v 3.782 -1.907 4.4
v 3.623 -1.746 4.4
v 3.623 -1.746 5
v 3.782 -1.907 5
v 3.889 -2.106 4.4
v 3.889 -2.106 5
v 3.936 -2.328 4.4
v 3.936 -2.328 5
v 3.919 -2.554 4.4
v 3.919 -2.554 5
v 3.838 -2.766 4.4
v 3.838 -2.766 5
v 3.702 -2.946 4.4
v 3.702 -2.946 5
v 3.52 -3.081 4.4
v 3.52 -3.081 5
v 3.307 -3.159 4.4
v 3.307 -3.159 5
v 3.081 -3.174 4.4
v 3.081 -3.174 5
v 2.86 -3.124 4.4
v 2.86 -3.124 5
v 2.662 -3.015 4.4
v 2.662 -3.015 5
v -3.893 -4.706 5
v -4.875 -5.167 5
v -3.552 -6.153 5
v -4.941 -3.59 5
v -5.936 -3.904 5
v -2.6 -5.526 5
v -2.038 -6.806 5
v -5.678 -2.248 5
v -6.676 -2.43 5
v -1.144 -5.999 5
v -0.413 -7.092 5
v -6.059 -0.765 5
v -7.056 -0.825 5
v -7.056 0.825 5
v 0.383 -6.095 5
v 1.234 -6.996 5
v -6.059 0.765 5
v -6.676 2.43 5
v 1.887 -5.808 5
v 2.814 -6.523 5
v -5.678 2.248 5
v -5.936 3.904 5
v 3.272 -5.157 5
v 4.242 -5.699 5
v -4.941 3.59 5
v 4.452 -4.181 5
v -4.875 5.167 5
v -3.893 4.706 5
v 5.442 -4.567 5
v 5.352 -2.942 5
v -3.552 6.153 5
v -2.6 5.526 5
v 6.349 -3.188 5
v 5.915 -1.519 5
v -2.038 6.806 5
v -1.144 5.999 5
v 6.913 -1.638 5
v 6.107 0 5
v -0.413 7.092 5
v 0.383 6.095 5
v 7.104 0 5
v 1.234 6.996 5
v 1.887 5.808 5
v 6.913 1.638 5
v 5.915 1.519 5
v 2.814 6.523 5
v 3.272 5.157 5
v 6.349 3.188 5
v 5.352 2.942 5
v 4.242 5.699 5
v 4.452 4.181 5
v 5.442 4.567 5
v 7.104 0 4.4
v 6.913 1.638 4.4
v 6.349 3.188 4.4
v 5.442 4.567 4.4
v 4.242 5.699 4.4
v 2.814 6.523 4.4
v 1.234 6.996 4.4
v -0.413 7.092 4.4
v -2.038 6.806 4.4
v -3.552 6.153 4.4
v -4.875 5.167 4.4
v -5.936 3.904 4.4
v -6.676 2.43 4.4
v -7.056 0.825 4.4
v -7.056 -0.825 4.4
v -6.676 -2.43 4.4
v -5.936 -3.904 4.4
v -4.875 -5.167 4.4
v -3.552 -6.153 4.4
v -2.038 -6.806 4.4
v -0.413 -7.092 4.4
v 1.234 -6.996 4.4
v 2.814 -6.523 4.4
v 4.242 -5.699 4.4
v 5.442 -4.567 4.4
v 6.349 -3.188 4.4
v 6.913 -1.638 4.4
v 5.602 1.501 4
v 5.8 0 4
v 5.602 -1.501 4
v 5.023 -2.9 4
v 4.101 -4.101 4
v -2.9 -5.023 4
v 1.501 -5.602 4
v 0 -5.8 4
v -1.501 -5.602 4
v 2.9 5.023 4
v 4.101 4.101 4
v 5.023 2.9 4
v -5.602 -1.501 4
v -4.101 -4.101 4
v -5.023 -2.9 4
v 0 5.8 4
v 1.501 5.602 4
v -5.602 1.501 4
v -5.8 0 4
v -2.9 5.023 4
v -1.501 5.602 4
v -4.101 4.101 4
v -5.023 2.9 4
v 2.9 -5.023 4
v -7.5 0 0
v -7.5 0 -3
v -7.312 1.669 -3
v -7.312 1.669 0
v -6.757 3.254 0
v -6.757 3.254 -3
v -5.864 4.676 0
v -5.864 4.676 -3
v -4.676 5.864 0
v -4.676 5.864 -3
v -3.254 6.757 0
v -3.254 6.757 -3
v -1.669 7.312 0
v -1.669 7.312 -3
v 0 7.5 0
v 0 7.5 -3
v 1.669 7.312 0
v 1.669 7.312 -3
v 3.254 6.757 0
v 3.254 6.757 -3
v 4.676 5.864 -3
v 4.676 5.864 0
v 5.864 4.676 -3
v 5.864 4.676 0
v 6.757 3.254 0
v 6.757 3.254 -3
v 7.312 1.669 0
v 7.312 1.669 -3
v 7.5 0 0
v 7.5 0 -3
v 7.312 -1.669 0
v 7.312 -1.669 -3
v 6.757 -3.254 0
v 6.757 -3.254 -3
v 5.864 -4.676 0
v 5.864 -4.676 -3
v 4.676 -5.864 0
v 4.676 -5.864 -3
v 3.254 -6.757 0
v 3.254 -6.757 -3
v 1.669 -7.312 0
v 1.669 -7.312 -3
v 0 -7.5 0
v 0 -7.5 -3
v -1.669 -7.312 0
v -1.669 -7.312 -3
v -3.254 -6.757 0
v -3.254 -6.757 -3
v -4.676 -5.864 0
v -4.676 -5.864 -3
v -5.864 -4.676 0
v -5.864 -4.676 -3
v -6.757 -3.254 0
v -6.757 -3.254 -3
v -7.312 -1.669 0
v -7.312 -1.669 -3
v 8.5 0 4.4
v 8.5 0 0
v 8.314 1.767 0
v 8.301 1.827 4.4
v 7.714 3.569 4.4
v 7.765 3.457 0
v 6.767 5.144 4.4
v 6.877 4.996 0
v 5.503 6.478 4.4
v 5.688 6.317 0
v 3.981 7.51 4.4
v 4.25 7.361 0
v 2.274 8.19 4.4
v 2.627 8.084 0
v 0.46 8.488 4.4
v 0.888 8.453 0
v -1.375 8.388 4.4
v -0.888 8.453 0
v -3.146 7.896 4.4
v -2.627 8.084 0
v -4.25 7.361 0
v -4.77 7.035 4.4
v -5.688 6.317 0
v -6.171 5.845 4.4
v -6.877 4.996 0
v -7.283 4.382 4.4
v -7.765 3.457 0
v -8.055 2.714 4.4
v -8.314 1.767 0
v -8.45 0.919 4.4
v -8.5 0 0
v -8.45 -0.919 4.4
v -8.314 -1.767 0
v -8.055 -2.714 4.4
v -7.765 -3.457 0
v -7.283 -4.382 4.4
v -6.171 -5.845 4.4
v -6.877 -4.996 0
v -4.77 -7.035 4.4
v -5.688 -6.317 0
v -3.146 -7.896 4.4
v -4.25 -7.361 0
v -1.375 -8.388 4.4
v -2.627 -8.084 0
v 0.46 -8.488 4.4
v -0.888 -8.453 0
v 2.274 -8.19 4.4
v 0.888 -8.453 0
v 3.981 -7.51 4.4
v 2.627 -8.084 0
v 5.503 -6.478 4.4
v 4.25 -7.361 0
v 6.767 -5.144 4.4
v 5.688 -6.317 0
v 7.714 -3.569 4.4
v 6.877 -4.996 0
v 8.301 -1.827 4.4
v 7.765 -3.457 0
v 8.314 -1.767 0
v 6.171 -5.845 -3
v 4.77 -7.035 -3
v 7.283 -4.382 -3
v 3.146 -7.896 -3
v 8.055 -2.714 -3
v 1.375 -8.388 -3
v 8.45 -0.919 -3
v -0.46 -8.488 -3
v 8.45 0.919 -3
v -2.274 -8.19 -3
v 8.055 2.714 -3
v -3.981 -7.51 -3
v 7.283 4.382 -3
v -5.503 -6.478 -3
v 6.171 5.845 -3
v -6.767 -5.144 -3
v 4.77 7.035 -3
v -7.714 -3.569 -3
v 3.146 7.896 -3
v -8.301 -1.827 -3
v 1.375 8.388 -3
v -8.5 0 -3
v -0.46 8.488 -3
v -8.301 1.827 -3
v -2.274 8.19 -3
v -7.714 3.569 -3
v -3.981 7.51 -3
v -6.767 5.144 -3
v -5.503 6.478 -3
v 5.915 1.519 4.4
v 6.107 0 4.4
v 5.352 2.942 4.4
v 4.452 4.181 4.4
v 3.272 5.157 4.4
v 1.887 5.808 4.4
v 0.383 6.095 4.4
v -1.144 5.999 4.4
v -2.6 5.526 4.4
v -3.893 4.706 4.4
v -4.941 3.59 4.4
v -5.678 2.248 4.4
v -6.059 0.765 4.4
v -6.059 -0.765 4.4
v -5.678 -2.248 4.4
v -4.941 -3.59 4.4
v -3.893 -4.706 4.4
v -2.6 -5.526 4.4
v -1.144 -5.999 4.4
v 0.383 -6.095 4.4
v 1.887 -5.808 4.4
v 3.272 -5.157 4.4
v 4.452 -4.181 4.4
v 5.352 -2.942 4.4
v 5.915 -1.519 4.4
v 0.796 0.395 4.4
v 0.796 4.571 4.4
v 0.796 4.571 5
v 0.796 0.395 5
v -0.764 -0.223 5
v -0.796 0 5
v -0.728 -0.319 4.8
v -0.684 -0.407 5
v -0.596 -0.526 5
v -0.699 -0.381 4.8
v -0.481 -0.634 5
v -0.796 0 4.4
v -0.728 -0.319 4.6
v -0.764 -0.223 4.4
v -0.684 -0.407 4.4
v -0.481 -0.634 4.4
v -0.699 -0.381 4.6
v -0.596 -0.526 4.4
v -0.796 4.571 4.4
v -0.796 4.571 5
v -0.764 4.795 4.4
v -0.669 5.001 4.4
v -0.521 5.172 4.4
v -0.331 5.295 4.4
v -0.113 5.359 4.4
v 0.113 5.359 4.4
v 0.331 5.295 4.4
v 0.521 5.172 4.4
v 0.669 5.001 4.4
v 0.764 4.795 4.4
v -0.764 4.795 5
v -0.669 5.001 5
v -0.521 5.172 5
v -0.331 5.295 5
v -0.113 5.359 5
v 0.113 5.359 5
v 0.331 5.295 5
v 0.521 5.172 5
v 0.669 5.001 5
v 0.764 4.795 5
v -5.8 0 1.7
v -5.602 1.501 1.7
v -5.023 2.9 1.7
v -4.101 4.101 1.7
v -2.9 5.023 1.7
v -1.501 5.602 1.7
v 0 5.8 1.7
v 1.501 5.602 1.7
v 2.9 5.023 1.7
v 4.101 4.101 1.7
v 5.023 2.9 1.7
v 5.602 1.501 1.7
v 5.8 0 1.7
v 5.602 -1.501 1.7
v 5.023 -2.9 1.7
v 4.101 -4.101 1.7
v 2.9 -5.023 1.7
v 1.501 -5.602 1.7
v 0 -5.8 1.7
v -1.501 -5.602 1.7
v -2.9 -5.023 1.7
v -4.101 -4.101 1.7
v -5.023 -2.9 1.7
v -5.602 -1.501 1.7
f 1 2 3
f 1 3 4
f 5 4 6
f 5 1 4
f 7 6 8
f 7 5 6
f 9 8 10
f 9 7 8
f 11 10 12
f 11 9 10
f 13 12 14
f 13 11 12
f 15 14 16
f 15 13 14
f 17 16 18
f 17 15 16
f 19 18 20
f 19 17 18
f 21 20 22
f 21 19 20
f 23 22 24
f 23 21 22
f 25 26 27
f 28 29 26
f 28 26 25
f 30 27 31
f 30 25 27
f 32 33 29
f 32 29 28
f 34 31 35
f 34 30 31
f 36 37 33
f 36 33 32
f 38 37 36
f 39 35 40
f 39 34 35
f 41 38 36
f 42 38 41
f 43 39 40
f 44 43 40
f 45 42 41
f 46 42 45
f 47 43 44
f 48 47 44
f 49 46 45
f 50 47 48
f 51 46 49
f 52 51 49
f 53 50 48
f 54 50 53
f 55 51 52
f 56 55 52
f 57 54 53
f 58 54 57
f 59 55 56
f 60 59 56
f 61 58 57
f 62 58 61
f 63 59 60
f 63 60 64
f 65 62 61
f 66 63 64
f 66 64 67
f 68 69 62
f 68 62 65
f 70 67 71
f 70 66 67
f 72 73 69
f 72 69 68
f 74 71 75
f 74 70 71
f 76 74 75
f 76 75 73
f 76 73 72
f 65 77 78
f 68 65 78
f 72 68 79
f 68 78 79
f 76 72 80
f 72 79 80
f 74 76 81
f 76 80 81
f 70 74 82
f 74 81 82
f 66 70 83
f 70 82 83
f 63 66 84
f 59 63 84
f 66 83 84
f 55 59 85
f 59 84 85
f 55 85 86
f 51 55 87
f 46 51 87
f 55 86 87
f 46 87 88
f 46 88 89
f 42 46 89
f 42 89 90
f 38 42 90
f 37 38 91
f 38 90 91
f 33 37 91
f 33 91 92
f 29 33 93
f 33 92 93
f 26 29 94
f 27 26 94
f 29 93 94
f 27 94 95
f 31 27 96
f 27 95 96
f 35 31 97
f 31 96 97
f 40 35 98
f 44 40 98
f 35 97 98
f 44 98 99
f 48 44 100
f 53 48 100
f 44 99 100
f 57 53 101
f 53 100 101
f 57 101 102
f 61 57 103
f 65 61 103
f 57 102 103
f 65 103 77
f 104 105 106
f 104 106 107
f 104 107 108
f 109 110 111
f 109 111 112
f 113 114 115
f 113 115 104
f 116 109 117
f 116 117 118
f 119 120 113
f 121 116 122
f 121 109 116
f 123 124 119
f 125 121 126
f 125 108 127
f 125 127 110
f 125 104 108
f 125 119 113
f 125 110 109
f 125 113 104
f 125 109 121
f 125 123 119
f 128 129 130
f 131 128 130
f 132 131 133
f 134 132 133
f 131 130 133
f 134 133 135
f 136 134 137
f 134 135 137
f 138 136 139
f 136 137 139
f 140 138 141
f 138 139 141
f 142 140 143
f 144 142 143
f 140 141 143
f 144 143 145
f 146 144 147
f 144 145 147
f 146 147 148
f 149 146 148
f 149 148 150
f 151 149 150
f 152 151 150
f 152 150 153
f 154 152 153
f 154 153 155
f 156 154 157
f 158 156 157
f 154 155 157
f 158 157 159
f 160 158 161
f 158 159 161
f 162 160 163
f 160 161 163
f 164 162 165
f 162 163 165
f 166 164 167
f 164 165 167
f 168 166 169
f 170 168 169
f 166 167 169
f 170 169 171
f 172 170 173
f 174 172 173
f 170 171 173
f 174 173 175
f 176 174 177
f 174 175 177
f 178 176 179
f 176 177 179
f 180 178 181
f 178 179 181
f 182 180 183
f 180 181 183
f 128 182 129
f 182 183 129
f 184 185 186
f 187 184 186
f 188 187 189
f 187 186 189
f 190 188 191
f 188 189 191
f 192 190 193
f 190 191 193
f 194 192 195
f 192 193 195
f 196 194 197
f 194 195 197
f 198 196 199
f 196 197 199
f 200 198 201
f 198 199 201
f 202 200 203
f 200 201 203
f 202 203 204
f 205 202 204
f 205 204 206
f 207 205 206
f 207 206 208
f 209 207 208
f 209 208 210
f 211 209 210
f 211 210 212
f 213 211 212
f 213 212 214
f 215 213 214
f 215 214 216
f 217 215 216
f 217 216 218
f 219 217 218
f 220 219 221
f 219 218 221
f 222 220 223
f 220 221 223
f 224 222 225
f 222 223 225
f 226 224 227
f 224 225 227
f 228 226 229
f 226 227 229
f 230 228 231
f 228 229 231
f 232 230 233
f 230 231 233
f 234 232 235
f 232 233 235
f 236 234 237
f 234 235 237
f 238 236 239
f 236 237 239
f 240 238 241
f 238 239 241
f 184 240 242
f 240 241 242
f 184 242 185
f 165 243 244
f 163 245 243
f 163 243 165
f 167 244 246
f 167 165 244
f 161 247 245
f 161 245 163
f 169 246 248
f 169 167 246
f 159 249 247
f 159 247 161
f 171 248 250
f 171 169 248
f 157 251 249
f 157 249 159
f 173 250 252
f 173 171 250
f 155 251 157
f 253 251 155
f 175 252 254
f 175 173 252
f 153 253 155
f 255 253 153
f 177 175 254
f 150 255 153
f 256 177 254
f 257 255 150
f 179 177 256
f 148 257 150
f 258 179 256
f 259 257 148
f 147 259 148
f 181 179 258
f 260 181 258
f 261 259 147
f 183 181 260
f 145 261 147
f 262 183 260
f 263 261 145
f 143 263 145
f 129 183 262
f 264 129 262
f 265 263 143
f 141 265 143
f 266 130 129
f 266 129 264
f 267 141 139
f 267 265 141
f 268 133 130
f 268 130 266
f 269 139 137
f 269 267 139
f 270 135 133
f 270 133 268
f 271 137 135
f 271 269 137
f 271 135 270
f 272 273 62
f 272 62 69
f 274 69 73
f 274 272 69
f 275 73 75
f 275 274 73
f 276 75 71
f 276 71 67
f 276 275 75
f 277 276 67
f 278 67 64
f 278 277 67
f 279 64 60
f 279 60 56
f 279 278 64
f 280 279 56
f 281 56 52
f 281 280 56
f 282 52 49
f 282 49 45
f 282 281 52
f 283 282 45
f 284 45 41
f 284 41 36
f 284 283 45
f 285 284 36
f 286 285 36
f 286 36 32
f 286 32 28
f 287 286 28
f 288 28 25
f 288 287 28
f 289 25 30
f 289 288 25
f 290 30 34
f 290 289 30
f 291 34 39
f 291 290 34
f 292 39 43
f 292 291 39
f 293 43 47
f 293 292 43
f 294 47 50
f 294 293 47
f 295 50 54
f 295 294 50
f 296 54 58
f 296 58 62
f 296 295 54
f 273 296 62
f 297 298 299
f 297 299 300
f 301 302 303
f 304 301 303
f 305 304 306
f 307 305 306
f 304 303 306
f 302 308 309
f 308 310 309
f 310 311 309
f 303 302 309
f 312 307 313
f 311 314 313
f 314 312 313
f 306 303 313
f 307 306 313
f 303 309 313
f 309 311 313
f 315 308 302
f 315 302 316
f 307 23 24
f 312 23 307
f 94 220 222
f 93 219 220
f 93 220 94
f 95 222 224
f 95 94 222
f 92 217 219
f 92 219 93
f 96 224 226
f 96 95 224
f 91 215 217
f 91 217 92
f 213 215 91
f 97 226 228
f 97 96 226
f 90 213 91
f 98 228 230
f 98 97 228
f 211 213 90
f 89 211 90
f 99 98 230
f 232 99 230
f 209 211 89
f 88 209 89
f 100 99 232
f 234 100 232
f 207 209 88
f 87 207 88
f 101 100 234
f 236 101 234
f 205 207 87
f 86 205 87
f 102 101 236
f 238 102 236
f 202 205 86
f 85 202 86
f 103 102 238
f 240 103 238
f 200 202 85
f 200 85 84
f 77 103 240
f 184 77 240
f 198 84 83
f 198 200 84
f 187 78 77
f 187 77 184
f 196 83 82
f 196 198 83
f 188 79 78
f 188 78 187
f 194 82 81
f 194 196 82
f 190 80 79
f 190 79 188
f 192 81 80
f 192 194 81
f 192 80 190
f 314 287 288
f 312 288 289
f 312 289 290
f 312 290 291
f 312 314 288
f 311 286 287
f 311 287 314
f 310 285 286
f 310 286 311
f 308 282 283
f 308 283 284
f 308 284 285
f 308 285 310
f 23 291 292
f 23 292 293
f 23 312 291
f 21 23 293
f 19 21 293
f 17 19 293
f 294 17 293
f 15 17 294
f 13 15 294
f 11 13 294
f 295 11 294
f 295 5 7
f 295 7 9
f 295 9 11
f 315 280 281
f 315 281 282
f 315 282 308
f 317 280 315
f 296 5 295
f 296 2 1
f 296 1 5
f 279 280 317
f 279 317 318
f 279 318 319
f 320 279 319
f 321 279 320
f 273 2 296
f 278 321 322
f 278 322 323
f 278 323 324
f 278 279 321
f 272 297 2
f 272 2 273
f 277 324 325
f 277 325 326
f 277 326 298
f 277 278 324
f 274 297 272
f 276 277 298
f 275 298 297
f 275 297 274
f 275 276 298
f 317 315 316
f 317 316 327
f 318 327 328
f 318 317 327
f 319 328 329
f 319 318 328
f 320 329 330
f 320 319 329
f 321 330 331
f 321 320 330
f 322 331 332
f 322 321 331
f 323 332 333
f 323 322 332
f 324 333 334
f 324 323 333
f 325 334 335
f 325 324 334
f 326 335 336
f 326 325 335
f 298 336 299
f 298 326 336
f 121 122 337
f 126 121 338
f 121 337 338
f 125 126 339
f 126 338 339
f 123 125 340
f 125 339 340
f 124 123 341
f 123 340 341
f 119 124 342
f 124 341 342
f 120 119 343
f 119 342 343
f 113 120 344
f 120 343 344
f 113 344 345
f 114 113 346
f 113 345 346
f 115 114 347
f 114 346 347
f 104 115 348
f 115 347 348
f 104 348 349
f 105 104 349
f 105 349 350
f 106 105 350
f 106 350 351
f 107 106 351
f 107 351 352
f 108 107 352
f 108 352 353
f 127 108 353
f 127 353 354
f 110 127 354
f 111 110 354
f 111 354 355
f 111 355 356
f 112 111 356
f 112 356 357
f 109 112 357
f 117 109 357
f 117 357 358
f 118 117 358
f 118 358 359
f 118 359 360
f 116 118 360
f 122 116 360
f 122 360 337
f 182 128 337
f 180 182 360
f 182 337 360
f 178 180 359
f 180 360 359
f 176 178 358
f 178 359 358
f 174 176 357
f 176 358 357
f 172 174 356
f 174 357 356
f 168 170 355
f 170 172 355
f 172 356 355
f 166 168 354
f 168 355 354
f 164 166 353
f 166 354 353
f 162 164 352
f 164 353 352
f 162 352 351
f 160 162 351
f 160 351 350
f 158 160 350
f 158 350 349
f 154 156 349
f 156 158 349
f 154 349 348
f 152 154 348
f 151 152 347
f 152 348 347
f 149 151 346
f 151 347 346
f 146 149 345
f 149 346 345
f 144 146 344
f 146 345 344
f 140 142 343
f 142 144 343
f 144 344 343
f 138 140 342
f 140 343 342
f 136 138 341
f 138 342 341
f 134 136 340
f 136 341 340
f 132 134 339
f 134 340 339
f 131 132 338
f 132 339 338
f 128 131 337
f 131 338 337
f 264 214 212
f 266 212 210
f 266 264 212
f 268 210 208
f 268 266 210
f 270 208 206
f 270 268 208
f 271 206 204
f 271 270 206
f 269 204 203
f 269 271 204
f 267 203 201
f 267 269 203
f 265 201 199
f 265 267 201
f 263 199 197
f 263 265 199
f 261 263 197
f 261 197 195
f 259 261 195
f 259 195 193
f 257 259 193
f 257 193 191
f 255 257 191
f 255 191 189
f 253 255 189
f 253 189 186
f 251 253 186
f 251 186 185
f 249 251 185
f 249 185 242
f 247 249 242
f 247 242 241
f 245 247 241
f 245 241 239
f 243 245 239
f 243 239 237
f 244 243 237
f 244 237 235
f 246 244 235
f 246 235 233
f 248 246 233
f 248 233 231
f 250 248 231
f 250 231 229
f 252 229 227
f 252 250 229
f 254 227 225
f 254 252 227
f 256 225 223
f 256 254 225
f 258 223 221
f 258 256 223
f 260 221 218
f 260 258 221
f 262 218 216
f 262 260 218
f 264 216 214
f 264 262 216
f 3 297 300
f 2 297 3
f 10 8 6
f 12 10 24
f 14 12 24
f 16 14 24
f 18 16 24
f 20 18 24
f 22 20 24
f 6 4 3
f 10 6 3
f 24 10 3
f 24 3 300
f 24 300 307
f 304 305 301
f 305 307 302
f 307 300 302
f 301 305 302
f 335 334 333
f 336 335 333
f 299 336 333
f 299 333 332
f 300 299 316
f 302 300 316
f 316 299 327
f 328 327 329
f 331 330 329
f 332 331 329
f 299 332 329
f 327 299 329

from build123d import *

# Parameters (mm, degrees)
SKETCH1_R           = 8.5
BOSS_EXTRUDE1_DEPTH = 4.4
SKETCH2_R           = 7.104307479
SKETCH2_R_2         = 6.107298405
BOSS_EXTRUDE2_DEPTH = 0.6
SKETCH3_R           = 5.8
CUT_EXTRUDE1_DEPTH  = 4
BOSS_EXTRUDE3_START = 3
SKETCH4_R           = 8.5
SKETCH4_R_2         = 7.5
BOSS_EXTRUDE3_DEPTH = 3


with BuildPart() as part:
    # Sketch1 → Boss-Extrude1 (new body)
    with BuildSketch(Plane.XY):
        Circle(SKETCH1_R)
    extrude(amount=BOSS_EXTRUDE1_DEPTH)

    # Sketch2 → Boss-Extrude2 (add)
    # profile 1 of 2: a face of its own
    with BuildSketch(Plane.XY.offset(4.4)):
        Circle(SKETCH2_R)
        Circle(SKETCH2_R_2, mode=Mode.SUBTRACT)
    # profile 2 of 2: a face of its own
    with BuildSketch(Plane.XY.offset(4.4)):
        with BuildLine():
            Line((-0.79575858, 0), (-0.79575858, 4.570978174))
            ThreePointArc((-0.79575858, 4.570978174), (0, 5.366736754), (0.79575858, 4.570978174))
            Line((0.79575858, 4.570978174), (0.79575858, 0.395496115))
            Line((0.79575858, 0.395496115), (3.622638776, -1.745931242))
            ThreePointArc((3.622638776, -1.745931242), (3.776443977, -2.860743961), (2.661631259, -3.014549161))
            Line((2.661631259, -3.014549161), (-0.480503759, -0.63430896))
            add(Edge.make_bspline(
                [(-0.79575858, 0), (-0.782929945, -0.180408247), (-0.768261528, -0.225601884), (-0.677231987, -0.437603968), (-0.573517685, -0.563848751), (-0.480503759, -0.63430896)],
                knots=[0, 0, 0, 0, 0.528419672, 0.628419672, 1, 1, 1, 1], degree=3))
        make_face()
    extrude(amount=BOSS_EXTRUDE2_DEPTH)

    # Sketch3 → Cut-Extrude1 (cut)
    with BuildSketch(Plane(origin=(0, 0, 0), x_dir=(-1, 0, 0), z_dir=(0, 0, -1))):
        Circle(SKETCH3_R)
    extrude(amount=-CUT_EXTRUDE1_DEPTH, mode=Mode.SUBTRACT)

    # Sketch4 → Boss-Extrude3 (add)
    with BuildSketch(Plane(origin=(0, 0, 0), x_dir=(-1, 0, 0), z_dir=(0, 0, -1)).offset(BOSS_EXTRUDE3_START)):
        Circle(SKETCH4_R)
        Circle(SKETCH4_R_2, mode=Mode.SUBTRACT)
    extrude(amount=-BOSS_EXTRUDE3_DEPTH)

    # Sketch6 → Cut-Revolve1 (revolve, cut)
    with BuildSketch(Plane(origin=(0, 0, 0), x_dir=(1, 0, 0), z_dir=(0, 1, 0)), mode=Mode.PRIVATE) as cut_revolve1_sk:
        Polygon((7.5, 0), (5.8, -1.7), (5.8, 0), align=None)
    revolve(cut_revolve1_sk.sketch.rotate(Axis((0, 0, -5.5), (0, 0, 1)), 180), axis=Axis((0, 0, -5.5), (0, 0, 1)), mode=Mode.SUBTRACT)


solid = part.part
